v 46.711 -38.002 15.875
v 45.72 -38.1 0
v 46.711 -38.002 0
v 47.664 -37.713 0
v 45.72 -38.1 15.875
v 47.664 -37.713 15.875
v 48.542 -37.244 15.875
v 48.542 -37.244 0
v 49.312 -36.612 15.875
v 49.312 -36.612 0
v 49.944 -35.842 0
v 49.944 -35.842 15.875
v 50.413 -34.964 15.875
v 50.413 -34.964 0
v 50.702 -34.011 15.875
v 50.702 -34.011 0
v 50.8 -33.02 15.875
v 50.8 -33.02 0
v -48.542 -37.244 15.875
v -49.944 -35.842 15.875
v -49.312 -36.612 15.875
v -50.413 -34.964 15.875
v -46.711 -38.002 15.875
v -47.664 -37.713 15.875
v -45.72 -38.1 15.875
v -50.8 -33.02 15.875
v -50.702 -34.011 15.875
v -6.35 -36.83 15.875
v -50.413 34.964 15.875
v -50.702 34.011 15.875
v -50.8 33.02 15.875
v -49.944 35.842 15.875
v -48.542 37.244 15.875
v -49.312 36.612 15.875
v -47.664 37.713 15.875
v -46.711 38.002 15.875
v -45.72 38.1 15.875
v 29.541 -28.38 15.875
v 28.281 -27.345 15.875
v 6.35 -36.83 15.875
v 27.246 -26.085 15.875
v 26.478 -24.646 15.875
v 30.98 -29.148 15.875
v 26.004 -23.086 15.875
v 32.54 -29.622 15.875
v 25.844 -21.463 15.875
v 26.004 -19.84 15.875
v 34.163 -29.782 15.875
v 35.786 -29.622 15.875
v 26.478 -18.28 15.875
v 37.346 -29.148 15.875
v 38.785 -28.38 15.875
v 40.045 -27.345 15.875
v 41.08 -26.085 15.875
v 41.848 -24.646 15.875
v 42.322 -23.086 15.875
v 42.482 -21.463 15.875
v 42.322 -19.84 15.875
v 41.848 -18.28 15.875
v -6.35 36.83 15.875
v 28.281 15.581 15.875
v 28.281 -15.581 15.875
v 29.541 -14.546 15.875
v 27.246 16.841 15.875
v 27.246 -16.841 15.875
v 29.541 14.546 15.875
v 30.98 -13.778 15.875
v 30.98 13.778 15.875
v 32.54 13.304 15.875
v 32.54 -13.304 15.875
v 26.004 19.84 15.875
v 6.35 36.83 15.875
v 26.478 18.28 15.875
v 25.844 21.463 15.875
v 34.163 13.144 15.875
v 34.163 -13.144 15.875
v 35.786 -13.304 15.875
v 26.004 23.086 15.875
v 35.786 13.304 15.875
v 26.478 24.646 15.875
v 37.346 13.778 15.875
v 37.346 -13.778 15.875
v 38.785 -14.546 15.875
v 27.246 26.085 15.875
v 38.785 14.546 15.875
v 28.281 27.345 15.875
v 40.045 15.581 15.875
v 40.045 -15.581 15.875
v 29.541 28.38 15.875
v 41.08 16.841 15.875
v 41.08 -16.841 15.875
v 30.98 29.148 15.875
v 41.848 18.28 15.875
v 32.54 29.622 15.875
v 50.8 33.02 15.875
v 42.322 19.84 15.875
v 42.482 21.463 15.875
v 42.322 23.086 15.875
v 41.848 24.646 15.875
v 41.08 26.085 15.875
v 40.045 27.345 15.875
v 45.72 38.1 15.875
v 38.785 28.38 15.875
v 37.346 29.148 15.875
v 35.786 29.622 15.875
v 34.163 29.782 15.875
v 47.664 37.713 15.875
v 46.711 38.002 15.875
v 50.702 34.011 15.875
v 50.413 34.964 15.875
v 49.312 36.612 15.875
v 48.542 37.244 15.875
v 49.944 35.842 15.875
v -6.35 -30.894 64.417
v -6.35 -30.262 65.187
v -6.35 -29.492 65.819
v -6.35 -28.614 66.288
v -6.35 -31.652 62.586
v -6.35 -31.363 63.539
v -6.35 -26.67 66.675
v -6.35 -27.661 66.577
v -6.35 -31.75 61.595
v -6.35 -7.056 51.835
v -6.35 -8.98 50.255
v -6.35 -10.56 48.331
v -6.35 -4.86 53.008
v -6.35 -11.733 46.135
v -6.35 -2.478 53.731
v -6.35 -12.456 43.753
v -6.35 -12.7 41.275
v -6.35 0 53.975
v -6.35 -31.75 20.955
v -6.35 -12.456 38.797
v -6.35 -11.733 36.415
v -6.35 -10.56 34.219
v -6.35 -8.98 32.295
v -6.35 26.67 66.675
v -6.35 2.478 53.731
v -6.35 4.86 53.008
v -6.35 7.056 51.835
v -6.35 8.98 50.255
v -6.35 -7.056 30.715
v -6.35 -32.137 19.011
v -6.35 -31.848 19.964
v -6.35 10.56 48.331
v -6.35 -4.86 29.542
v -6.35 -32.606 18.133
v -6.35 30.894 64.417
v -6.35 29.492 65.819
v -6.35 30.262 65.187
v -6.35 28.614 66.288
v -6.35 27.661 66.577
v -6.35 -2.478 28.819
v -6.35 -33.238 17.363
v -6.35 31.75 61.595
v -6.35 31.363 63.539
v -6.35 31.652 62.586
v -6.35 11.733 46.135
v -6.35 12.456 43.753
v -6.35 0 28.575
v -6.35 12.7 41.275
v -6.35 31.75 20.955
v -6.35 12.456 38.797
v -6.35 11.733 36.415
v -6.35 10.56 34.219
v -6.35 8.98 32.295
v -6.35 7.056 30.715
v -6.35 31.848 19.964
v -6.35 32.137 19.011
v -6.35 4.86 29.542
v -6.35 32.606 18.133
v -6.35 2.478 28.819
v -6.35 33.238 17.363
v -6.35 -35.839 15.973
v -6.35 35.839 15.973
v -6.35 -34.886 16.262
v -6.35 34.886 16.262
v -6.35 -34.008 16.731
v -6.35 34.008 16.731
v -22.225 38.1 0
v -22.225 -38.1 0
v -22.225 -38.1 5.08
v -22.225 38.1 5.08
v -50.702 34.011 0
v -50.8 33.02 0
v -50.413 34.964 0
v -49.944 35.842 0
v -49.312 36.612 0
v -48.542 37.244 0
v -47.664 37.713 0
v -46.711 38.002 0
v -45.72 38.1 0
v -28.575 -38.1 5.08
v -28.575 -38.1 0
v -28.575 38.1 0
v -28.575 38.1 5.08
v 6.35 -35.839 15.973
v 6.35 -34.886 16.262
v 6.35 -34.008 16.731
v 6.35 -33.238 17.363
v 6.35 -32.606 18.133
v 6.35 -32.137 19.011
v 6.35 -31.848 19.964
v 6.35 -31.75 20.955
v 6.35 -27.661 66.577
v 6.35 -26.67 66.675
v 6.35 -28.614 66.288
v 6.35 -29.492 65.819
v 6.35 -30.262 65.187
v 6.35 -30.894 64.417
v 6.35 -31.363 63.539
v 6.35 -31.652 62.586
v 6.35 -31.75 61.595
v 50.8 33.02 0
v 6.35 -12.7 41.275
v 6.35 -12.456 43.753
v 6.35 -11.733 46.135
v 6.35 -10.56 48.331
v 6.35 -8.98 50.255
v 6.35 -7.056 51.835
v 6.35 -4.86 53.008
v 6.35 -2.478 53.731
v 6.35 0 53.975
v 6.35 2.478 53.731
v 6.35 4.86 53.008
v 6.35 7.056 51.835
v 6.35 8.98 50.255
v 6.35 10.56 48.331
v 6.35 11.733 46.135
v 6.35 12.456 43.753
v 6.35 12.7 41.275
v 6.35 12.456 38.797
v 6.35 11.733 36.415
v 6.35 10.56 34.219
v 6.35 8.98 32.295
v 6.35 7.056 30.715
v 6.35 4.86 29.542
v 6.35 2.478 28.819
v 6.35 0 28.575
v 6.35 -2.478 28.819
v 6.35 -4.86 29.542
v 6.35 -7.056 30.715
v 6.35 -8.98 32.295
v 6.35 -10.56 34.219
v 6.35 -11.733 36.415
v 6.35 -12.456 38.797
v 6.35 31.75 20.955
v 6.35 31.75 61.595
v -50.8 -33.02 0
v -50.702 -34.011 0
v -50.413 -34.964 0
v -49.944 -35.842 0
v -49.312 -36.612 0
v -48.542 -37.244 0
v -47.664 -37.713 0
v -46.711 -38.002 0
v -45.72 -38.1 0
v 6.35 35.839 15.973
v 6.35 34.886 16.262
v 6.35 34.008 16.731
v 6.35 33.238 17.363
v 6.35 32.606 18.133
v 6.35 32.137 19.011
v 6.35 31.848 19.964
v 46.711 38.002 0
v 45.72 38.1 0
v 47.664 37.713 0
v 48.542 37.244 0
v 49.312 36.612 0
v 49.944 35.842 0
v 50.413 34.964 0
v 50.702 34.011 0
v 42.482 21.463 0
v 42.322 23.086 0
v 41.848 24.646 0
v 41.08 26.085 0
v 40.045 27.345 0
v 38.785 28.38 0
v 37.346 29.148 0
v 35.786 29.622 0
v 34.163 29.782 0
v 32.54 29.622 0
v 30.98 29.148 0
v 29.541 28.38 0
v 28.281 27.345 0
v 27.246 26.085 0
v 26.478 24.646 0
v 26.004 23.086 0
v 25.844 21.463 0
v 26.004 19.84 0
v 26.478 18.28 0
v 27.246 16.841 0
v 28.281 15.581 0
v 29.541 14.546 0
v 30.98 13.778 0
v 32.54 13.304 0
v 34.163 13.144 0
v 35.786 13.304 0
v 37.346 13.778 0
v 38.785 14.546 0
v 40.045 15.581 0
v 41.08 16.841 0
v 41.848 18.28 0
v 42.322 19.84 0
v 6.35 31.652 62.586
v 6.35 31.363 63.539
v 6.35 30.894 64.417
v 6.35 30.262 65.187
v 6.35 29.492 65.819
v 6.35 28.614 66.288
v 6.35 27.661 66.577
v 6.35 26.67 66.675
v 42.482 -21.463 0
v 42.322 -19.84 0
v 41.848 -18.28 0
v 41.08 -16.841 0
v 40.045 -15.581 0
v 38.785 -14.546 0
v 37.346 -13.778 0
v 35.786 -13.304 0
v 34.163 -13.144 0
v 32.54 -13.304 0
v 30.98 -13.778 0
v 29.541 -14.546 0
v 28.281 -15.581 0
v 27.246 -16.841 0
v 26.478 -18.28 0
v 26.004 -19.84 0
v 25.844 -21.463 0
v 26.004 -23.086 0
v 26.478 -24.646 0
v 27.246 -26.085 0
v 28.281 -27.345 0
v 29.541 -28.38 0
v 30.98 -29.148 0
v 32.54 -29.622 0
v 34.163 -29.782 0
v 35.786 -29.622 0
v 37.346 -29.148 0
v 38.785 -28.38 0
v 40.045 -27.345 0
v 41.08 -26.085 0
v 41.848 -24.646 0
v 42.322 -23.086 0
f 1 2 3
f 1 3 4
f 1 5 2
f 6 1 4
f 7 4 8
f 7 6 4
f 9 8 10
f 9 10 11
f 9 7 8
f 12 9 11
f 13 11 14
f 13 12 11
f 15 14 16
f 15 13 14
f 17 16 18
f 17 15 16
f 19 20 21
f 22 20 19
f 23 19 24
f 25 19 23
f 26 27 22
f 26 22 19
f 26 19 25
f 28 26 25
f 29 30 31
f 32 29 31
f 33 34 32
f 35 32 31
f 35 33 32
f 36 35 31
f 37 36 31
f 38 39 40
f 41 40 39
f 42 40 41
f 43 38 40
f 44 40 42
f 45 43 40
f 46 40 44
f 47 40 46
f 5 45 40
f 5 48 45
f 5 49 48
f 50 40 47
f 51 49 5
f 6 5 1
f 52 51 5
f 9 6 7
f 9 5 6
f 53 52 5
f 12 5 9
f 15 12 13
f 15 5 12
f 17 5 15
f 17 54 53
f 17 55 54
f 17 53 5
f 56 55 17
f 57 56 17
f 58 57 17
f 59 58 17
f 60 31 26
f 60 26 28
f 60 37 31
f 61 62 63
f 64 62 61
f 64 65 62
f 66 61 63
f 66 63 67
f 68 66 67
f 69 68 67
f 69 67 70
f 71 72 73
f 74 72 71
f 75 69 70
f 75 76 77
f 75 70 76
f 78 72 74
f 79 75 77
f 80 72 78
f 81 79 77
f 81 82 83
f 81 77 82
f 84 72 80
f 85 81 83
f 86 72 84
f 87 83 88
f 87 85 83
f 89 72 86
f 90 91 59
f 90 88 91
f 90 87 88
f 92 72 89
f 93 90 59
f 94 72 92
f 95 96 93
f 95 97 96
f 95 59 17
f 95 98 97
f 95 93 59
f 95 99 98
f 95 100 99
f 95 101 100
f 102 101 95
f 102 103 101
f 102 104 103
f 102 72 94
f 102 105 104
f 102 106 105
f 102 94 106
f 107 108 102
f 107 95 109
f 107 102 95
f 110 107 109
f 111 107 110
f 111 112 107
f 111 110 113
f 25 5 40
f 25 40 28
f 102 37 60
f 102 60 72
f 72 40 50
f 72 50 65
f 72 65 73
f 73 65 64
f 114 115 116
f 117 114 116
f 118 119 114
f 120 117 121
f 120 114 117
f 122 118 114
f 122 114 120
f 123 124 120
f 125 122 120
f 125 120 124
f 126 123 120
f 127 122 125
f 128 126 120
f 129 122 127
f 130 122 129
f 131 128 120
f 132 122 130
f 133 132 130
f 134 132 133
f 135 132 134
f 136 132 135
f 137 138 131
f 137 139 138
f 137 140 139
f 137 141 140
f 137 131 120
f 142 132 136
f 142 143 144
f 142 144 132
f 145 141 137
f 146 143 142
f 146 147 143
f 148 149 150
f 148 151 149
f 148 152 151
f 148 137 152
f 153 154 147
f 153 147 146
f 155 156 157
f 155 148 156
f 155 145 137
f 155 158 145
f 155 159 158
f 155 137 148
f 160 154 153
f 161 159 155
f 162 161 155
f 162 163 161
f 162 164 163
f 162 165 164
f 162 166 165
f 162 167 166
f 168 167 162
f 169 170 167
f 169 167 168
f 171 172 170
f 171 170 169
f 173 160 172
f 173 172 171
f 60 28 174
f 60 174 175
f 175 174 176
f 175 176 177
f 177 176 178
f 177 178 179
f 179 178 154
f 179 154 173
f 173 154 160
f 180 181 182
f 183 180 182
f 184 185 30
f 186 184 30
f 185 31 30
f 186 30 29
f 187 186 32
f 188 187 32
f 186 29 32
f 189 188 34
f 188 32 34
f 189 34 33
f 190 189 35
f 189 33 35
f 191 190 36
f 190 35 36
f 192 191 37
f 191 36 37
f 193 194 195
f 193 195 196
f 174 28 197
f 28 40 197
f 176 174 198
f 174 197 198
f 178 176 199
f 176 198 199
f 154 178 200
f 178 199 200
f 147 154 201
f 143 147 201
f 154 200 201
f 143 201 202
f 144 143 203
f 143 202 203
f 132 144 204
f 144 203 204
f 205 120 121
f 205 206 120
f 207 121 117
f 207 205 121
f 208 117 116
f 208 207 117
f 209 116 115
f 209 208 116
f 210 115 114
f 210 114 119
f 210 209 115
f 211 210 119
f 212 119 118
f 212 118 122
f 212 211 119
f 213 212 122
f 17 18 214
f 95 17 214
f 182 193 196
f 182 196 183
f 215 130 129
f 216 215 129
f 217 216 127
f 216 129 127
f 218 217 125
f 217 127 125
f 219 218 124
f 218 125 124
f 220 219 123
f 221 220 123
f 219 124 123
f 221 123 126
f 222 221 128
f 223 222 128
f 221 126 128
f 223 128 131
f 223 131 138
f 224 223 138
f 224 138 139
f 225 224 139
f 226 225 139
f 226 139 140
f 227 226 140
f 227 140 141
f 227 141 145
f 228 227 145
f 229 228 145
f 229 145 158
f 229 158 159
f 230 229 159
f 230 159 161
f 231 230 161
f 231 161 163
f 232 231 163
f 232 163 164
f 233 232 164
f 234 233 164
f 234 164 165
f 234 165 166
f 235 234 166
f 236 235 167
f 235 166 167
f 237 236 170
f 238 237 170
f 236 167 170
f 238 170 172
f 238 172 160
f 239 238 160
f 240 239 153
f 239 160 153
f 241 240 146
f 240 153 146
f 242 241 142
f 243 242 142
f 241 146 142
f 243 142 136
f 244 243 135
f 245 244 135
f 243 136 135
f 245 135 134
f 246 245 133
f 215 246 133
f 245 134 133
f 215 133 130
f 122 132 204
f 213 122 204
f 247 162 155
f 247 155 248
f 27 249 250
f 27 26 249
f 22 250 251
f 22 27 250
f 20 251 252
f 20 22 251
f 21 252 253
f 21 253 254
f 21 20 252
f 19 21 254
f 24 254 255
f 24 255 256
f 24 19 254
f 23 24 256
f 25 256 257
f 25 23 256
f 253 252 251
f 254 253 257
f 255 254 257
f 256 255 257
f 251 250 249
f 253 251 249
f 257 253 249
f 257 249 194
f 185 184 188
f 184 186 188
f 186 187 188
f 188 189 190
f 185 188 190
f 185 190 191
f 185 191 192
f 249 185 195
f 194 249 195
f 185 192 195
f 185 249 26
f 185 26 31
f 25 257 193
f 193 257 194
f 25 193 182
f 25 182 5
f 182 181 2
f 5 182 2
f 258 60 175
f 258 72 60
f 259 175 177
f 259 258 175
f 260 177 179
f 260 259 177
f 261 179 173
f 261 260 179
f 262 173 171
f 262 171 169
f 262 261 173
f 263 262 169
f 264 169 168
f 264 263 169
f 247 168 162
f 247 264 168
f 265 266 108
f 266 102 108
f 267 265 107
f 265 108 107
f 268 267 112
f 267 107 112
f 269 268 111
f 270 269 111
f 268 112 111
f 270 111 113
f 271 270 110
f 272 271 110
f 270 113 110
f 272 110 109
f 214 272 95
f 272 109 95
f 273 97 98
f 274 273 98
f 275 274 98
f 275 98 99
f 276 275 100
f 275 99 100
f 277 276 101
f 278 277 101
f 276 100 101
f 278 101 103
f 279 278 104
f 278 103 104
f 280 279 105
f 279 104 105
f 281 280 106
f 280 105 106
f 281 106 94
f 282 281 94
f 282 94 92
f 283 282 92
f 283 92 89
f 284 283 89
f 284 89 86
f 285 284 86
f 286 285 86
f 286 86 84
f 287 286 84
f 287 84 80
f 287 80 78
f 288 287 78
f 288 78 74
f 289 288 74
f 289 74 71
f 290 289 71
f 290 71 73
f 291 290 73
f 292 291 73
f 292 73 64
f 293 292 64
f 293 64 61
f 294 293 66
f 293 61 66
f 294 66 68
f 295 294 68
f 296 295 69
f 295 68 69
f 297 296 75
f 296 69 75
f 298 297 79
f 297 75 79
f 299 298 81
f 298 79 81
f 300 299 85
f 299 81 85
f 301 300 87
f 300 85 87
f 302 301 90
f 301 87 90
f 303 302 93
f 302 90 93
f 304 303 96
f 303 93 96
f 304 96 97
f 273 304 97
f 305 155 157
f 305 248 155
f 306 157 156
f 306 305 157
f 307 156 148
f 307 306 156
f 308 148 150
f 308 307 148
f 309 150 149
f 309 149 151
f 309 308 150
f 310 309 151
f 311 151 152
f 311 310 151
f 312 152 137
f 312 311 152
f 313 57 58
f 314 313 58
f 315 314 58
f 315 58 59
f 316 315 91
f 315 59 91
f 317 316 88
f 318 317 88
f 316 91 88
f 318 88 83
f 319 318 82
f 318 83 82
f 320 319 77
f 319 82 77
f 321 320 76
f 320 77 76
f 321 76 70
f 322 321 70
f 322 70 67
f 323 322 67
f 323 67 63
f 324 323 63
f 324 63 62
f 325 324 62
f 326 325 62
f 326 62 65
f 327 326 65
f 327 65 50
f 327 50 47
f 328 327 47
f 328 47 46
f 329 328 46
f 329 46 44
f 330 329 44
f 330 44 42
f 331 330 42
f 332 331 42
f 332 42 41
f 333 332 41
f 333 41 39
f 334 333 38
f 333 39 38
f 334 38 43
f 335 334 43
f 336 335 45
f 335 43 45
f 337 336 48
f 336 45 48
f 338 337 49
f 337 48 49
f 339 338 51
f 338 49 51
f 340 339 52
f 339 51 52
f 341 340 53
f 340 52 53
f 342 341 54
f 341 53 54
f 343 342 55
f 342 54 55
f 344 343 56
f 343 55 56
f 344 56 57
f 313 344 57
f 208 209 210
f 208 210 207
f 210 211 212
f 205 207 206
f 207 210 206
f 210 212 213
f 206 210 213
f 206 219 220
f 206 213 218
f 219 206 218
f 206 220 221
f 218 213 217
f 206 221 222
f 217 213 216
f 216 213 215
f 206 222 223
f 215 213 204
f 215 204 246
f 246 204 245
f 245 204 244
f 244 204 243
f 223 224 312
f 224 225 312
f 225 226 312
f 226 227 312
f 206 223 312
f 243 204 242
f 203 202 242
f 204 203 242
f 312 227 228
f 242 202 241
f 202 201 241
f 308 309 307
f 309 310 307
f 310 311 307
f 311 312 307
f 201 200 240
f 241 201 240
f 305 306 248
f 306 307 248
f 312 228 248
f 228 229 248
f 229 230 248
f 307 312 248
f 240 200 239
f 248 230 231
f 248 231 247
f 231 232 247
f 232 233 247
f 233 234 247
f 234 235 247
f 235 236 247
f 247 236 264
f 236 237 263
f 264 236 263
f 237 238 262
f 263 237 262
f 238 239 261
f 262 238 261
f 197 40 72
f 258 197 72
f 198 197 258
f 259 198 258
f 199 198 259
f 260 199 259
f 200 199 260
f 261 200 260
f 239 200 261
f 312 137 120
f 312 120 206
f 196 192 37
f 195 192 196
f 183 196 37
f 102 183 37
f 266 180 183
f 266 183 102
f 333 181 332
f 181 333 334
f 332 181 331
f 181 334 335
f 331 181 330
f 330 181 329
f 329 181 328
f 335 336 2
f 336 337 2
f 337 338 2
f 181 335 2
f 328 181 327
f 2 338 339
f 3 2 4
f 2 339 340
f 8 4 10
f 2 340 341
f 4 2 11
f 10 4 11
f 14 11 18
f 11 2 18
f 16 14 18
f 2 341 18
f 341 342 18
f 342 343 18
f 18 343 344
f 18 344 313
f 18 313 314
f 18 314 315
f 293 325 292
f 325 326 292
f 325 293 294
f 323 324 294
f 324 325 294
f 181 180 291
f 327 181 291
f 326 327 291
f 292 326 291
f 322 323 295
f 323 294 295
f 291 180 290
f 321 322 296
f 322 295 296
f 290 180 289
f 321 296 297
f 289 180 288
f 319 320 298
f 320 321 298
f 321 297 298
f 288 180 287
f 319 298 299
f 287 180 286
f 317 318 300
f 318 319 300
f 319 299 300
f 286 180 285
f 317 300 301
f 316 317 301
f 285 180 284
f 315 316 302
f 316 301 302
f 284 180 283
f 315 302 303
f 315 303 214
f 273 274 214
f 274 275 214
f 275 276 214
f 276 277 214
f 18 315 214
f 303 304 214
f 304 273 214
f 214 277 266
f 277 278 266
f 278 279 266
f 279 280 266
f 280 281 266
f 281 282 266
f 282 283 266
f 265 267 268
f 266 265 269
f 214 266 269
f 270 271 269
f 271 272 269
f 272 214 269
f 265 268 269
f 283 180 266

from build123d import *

# Parameters (mm, degrees)
F0_W      = 101.6
F0_H      = 76.2
F0_W_2    = 12.7
F0_H_2    = 63.5
F1_DEPTH  = 15.875
F2_R      = 5.08
F3_R      = 8.3185
F4_DEPTH  = 25.4
F5_DEPTH  = 66.675
F6_R      = 5.08
F7_R      = 12.7
F8_DEPTH  = 25.4
F9_W      = 6.35
F9_H      = 5.08
F10_DEPTH = 101.6


with BuildPart() as f1:
    # F0 (on Top) → F1 (new body)
    with BuildSketch(Plane.XY):
        Rectangle(F0_W, F0_H)
        Rectangle(F0_W_2, F0_H_2, mode=Mode.SUBTRACT)
    extrude(amount=F1_DEPTH)

    # F2
    f2_edges = [f1.edges().sort_by_distance(p)[0] for p in [
        (-50.8, 38.1, 7.9375),
        (-50.8, -38.1, 7.9375),
        (50.8, -38.1, 7.9375),
        (50.8, 38.1, 7.9375),
    ]]
    fillet(f2_edges, radius=F2_R)

    # F3 (on face) → F4 (cut)
    with BuildSketch(Plane.XY.offset(15.875)):
        with Locations((34.163, -21.463)):
            Circle(F3_R)
        with Locations((34.163, 21.463)):
            Circle(F3_R)
    extrude(amount=-F4_DEPTH, mode=Mode.SUBTRACT)

    # F0 (on Top) → F5 (join)
    with BuildSketch(Plane.XY):
        Rectangle(F0_W_2, F0_H_2)
    extrude(amount=F5_DEPTH)

    # F6
    f6_edges = [f1.edges().sort_by_distance(p)[0] for p in [
        (0, -31.75, 66.675),
        (0, 31.75, 66.675),
        (0, 31.75, 15.875),
        (0, -31.75, 15.875),
    ]]
    fillet(f6_edges, radius=F6_R)

    # F7 (on face) → F8 (cut)
    with BuildSketch(Plane(origin=(-6.35, 0, 0), x_dir=(0, -1, 0), z_dir=(-1, 0, 0))):
        with Locations((0, 41.275)):
            Circle(F7_R)
    extrude(amount=-F8_DEPTH, mode=Mode.SUBTRACT)

    # F9 (on face) → F10 (cut)
    with BuildSketch(Plane.XZ.offset(38.1)):
        with Locations((-25.4, 2.54)):
            Rectangle(F9_W, F9_H)
    extrude(amount=-F10_DEPTH, mode=Mode.SUBTRACT)


solid = f1.part
